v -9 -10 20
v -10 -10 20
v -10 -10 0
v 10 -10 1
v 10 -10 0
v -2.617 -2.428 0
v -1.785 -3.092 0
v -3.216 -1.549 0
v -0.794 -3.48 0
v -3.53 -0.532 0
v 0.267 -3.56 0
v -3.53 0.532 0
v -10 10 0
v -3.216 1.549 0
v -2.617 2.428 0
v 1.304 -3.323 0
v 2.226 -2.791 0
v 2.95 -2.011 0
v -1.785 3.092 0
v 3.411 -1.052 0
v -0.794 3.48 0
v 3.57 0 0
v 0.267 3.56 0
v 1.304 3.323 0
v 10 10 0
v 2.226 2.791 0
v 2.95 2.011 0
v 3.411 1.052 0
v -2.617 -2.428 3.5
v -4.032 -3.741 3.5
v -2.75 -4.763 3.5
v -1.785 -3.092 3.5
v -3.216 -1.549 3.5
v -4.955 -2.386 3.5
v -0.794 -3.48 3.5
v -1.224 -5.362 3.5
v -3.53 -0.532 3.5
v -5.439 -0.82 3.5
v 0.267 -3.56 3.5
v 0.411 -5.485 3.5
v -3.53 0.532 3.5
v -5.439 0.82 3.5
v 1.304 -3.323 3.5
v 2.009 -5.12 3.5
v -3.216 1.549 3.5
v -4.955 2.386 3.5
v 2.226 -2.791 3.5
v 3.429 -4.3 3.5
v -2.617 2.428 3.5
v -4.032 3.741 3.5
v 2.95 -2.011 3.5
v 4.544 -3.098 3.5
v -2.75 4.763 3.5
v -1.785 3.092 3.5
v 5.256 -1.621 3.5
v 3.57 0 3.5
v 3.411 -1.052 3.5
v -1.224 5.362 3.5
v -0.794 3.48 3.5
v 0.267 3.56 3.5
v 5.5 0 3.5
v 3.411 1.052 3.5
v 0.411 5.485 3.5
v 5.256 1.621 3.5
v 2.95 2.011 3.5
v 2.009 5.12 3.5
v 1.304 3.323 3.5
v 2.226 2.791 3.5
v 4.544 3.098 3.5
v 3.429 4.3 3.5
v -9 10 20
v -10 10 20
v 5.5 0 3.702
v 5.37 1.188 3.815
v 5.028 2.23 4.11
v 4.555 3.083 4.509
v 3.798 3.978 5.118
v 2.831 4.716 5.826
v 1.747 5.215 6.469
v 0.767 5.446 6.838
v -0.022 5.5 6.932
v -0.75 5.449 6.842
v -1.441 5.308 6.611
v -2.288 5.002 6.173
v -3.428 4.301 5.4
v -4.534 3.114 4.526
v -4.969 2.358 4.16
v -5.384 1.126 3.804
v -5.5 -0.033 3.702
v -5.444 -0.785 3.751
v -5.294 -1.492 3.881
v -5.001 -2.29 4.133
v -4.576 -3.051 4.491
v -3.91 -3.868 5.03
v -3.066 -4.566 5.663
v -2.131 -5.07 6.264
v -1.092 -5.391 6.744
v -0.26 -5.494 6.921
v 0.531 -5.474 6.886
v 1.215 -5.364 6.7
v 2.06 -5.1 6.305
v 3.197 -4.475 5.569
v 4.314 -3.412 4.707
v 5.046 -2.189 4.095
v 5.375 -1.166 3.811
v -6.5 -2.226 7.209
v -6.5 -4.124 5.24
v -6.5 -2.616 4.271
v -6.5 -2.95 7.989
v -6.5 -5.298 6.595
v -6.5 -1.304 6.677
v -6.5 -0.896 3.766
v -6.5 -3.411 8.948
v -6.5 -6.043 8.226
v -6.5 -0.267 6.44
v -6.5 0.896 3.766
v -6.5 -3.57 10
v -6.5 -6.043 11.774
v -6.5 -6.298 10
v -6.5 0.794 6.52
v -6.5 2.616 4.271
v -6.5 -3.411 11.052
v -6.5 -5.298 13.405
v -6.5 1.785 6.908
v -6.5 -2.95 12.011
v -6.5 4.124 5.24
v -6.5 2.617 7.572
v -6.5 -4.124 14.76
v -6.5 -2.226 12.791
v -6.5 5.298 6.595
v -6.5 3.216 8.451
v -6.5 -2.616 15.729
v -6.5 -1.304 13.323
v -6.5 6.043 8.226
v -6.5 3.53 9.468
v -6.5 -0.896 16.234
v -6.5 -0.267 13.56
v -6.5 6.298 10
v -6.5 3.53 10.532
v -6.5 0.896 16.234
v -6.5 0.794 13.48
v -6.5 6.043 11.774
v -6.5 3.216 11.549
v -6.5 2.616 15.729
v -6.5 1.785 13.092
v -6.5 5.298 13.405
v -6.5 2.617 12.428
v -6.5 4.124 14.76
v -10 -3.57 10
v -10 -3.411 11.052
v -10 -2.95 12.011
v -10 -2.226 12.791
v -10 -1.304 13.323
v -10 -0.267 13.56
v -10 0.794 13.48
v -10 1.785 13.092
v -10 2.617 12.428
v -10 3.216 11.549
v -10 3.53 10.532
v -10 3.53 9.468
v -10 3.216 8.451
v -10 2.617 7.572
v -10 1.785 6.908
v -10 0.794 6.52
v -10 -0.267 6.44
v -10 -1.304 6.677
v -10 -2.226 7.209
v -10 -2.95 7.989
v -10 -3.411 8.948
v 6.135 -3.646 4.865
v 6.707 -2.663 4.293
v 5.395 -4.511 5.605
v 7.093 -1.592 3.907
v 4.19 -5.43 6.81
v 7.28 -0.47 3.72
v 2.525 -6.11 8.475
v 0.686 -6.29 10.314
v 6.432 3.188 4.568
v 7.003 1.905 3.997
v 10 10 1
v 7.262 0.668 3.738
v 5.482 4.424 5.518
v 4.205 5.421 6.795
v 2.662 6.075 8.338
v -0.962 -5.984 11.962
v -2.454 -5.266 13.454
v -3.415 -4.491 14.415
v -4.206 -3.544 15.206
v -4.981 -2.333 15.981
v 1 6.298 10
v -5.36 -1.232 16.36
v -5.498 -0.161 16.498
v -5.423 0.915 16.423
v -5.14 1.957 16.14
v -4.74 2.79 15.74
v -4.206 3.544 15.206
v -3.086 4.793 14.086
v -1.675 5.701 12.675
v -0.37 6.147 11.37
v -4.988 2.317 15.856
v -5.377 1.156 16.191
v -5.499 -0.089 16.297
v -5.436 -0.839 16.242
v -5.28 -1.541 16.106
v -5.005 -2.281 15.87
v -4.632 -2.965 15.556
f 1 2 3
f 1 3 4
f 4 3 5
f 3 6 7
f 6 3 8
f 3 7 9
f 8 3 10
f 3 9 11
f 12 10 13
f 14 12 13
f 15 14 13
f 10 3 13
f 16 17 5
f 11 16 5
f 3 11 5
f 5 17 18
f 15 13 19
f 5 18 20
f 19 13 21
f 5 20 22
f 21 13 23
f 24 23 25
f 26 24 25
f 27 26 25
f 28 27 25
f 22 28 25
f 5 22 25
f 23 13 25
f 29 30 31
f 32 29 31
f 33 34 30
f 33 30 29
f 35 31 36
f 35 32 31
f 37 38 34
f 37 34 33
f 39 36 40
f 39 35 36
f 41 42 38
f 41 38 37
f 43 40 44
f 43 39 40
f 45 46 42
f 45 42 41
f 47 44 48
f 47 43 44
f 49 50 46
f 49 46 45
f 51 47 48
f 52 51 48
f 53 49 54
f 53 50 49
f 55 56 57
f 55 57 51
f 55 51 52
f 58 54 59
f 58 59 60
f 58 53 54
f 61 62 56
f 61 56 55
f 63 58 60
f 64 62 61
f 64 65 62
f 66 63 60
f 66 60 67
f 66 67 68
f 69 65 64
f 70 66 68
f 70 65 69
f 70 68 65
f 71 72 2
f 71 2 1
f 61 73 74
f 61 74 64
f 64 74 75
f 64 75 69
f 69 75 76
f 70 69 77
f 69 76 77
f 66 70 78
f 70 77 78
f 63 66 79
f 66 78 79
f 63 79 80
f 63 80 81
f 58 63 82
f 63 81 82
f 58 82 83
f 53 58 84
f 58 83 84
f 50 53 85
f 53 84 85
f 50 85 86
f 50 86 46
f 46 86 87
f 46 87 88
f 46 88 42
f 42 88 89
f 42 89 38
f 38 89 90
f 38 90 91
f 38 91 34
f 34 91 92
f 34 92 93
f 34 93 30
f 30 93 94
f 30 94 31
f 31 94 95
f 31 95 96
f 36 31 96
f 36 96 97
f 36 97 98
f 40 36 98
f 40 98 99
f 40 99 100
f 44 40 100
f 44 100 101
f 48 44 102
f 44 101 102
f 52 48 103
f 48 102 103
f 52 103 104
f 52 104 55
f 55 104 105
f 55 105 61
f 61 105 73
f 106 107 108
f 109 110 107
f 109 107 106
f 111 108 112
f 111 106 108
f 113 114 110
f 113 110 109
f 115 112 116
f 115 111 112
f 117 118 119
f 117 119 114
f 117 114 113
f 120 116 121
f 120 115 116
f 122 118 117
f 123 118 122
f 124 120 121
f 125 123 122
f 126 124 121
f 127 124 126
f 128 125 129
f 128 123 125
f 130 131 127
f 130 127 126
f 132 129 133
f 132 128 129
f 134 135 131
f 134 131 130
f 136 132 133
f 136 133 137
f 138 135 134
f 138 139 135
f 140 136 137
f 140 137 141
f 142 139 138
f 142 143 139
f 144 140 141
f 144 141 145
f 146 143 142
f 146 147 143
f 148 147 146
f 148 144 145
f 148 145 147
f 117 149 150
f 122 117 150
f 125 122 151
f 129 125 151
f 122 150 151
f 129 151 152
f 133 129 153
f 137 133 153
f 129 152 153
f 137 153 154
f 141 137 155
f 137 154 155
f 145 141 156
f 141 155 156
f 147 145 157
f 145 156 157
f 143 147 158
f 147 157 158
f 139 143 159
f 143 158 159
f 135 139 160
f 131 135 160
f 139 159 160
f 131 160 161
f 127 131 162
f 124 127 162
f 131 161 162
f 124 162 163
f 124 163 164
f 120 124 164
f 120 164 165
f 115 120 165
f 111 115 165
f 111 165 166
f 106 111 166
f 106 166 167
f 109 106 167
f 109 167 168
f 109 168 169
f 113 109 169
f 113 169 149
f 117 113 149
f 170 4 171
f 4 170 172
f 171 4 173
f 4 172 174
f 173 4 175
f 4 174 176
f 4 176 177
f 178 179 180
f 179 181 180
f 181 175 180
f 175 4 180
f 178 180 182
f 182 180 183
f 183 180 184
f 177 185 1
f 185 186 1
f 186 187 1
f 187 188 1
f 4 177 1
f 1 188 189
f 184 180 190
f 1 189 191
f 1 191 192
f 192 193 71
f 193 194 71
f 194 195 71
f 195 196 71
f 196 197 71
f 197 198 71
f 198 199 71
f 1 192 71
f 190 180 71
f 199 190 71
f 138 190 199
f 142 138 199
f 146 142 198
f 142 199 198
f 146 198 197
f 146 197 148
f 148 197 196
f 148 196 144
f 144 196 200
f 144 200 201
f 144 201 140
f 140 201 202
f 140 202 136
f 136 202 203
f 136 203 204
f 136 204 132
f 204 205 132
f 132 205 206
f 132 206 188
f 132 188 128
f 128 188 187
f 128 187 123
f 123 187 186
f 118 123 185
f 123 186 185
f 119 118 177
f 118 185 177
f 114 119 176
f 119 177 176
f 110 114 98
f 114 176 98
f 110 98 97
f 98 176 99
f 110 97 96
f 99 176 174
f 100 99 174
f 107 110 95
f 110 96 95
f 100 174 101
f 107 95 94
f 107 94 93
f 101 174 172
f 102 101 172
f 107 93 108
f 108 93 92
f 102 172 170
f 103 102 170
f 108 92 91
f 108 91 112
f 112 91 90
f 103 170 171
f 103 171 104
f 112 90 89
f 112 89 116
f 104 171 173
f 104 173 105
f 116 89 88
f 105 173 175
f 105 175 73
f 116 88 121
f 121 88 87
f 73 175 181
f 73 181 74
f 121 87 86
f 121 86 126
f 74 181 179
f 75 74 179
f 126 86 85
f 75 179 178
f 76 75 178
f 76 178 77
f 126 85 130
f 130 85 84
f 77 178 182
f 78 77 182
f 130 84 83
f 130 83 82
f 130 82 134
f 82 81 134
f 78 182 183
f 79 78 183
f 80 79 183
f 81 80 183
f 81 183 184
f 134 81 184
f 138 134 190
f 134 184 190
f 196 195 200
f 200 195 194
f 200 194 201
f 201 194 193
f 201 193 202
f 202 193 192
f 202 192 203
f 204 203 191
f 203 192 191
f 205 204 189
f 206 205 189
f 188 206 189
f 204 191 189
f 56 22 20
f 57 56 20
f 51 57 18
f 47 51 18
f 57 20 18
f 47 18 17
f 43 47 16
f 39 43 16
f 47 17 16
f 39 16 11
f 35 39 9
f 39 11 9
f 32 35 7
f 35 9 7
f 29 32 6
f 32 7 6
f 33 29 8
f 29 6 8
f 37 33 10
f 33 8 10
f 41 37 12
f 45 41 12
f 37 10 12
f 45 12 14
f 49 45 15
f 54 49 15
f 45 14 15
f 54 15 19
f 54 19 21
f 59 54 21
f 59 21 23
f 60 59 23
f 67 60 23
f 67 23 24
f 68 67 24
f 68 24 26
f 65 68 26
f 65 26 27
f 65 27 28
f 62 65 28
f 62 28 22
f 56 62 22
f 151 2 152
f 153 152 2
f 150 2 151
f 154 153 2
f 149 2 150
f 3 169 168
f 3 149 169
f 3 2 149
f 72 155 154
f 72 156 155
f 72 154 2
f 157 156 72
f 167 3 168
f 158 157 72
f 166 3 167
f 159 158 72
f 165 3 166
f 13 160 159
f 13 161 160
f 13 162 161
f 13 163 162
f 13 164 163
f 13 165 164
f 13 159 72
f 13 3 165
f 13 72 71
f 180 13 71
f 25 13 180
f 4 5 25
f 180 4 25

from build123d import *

# Parameters (mm, degrees)
F0_W      = 20
F0_H      = 20
F1_DEPTH  = 20
F2_R      = 6.297785
F3_DEPTH  = 16.5
F4_R      = 5.5
F5_DEPTH  = 16.5
F6_R      = 3.57
F7_DEPTH  = 20.001
F8_R      = 3.57
F9_DEPTH  = 20.001
F11_DEPTH = 20.001


with BuildPart() as f1:
    # F0 (on Top) → F1 (new body)
    with BuildSketch(Plane.XY):
        Rectangle(F0_W, F0_H)
    extrude(amount=F1_DEPTH)

    # F2 (on face) → F3 (cut)
    with BuildSketch(Plane.YZ.offset(10)):
        with Locations((0, 10)):
            Circle(F2_R)
    extrude(amount=-F3_DEPTH, mode=Mode.SUBTRACT)

    # F4 (on face) → F5 (cut)
    with BuildSketch(Plane.XY.offset(20)):
        Circle(F4_R)
    extrude(amount=-F5_DEPTH, mode=Mode.SUBTRACT)

    # F6 (on face) → F7 (cut, through all)
    with BuildSketch(Plane(origin=(0, 0, 0), x_dir=(1, 0, 0), z_dir=(0, 0, -1))):
        Circle(F6_R)
    extrude(amount=-F7_DEPTH, mode=Mode.SUBTRACT)

    # F8 (on face) → F9 (cut, through all)
    with BuildSketch(Plane(origin=(-10, 0, 0), x_dir=(0, -1, 0), z_dir=(-1, 0, 0))):
        with Locations((0, 10)):
            Circle(F8_R)
    extrude(amount=-F9_DEPTH, mode=Mode.SUBTRACT)

    # F10 (on face) → F11 (cut, through all)
    with BuildSketch(Plane(origin=(0, 10, 0), x_dir=(-1, 0, 0), z_dir=(0, 1, 0))):
        Polygon((9, 20), (-10, 20), (-10, 1), align=None)
    extrude(amount=-F11_DEPTH, mode=Mode.SUBTRACT)


solid = f1.part
